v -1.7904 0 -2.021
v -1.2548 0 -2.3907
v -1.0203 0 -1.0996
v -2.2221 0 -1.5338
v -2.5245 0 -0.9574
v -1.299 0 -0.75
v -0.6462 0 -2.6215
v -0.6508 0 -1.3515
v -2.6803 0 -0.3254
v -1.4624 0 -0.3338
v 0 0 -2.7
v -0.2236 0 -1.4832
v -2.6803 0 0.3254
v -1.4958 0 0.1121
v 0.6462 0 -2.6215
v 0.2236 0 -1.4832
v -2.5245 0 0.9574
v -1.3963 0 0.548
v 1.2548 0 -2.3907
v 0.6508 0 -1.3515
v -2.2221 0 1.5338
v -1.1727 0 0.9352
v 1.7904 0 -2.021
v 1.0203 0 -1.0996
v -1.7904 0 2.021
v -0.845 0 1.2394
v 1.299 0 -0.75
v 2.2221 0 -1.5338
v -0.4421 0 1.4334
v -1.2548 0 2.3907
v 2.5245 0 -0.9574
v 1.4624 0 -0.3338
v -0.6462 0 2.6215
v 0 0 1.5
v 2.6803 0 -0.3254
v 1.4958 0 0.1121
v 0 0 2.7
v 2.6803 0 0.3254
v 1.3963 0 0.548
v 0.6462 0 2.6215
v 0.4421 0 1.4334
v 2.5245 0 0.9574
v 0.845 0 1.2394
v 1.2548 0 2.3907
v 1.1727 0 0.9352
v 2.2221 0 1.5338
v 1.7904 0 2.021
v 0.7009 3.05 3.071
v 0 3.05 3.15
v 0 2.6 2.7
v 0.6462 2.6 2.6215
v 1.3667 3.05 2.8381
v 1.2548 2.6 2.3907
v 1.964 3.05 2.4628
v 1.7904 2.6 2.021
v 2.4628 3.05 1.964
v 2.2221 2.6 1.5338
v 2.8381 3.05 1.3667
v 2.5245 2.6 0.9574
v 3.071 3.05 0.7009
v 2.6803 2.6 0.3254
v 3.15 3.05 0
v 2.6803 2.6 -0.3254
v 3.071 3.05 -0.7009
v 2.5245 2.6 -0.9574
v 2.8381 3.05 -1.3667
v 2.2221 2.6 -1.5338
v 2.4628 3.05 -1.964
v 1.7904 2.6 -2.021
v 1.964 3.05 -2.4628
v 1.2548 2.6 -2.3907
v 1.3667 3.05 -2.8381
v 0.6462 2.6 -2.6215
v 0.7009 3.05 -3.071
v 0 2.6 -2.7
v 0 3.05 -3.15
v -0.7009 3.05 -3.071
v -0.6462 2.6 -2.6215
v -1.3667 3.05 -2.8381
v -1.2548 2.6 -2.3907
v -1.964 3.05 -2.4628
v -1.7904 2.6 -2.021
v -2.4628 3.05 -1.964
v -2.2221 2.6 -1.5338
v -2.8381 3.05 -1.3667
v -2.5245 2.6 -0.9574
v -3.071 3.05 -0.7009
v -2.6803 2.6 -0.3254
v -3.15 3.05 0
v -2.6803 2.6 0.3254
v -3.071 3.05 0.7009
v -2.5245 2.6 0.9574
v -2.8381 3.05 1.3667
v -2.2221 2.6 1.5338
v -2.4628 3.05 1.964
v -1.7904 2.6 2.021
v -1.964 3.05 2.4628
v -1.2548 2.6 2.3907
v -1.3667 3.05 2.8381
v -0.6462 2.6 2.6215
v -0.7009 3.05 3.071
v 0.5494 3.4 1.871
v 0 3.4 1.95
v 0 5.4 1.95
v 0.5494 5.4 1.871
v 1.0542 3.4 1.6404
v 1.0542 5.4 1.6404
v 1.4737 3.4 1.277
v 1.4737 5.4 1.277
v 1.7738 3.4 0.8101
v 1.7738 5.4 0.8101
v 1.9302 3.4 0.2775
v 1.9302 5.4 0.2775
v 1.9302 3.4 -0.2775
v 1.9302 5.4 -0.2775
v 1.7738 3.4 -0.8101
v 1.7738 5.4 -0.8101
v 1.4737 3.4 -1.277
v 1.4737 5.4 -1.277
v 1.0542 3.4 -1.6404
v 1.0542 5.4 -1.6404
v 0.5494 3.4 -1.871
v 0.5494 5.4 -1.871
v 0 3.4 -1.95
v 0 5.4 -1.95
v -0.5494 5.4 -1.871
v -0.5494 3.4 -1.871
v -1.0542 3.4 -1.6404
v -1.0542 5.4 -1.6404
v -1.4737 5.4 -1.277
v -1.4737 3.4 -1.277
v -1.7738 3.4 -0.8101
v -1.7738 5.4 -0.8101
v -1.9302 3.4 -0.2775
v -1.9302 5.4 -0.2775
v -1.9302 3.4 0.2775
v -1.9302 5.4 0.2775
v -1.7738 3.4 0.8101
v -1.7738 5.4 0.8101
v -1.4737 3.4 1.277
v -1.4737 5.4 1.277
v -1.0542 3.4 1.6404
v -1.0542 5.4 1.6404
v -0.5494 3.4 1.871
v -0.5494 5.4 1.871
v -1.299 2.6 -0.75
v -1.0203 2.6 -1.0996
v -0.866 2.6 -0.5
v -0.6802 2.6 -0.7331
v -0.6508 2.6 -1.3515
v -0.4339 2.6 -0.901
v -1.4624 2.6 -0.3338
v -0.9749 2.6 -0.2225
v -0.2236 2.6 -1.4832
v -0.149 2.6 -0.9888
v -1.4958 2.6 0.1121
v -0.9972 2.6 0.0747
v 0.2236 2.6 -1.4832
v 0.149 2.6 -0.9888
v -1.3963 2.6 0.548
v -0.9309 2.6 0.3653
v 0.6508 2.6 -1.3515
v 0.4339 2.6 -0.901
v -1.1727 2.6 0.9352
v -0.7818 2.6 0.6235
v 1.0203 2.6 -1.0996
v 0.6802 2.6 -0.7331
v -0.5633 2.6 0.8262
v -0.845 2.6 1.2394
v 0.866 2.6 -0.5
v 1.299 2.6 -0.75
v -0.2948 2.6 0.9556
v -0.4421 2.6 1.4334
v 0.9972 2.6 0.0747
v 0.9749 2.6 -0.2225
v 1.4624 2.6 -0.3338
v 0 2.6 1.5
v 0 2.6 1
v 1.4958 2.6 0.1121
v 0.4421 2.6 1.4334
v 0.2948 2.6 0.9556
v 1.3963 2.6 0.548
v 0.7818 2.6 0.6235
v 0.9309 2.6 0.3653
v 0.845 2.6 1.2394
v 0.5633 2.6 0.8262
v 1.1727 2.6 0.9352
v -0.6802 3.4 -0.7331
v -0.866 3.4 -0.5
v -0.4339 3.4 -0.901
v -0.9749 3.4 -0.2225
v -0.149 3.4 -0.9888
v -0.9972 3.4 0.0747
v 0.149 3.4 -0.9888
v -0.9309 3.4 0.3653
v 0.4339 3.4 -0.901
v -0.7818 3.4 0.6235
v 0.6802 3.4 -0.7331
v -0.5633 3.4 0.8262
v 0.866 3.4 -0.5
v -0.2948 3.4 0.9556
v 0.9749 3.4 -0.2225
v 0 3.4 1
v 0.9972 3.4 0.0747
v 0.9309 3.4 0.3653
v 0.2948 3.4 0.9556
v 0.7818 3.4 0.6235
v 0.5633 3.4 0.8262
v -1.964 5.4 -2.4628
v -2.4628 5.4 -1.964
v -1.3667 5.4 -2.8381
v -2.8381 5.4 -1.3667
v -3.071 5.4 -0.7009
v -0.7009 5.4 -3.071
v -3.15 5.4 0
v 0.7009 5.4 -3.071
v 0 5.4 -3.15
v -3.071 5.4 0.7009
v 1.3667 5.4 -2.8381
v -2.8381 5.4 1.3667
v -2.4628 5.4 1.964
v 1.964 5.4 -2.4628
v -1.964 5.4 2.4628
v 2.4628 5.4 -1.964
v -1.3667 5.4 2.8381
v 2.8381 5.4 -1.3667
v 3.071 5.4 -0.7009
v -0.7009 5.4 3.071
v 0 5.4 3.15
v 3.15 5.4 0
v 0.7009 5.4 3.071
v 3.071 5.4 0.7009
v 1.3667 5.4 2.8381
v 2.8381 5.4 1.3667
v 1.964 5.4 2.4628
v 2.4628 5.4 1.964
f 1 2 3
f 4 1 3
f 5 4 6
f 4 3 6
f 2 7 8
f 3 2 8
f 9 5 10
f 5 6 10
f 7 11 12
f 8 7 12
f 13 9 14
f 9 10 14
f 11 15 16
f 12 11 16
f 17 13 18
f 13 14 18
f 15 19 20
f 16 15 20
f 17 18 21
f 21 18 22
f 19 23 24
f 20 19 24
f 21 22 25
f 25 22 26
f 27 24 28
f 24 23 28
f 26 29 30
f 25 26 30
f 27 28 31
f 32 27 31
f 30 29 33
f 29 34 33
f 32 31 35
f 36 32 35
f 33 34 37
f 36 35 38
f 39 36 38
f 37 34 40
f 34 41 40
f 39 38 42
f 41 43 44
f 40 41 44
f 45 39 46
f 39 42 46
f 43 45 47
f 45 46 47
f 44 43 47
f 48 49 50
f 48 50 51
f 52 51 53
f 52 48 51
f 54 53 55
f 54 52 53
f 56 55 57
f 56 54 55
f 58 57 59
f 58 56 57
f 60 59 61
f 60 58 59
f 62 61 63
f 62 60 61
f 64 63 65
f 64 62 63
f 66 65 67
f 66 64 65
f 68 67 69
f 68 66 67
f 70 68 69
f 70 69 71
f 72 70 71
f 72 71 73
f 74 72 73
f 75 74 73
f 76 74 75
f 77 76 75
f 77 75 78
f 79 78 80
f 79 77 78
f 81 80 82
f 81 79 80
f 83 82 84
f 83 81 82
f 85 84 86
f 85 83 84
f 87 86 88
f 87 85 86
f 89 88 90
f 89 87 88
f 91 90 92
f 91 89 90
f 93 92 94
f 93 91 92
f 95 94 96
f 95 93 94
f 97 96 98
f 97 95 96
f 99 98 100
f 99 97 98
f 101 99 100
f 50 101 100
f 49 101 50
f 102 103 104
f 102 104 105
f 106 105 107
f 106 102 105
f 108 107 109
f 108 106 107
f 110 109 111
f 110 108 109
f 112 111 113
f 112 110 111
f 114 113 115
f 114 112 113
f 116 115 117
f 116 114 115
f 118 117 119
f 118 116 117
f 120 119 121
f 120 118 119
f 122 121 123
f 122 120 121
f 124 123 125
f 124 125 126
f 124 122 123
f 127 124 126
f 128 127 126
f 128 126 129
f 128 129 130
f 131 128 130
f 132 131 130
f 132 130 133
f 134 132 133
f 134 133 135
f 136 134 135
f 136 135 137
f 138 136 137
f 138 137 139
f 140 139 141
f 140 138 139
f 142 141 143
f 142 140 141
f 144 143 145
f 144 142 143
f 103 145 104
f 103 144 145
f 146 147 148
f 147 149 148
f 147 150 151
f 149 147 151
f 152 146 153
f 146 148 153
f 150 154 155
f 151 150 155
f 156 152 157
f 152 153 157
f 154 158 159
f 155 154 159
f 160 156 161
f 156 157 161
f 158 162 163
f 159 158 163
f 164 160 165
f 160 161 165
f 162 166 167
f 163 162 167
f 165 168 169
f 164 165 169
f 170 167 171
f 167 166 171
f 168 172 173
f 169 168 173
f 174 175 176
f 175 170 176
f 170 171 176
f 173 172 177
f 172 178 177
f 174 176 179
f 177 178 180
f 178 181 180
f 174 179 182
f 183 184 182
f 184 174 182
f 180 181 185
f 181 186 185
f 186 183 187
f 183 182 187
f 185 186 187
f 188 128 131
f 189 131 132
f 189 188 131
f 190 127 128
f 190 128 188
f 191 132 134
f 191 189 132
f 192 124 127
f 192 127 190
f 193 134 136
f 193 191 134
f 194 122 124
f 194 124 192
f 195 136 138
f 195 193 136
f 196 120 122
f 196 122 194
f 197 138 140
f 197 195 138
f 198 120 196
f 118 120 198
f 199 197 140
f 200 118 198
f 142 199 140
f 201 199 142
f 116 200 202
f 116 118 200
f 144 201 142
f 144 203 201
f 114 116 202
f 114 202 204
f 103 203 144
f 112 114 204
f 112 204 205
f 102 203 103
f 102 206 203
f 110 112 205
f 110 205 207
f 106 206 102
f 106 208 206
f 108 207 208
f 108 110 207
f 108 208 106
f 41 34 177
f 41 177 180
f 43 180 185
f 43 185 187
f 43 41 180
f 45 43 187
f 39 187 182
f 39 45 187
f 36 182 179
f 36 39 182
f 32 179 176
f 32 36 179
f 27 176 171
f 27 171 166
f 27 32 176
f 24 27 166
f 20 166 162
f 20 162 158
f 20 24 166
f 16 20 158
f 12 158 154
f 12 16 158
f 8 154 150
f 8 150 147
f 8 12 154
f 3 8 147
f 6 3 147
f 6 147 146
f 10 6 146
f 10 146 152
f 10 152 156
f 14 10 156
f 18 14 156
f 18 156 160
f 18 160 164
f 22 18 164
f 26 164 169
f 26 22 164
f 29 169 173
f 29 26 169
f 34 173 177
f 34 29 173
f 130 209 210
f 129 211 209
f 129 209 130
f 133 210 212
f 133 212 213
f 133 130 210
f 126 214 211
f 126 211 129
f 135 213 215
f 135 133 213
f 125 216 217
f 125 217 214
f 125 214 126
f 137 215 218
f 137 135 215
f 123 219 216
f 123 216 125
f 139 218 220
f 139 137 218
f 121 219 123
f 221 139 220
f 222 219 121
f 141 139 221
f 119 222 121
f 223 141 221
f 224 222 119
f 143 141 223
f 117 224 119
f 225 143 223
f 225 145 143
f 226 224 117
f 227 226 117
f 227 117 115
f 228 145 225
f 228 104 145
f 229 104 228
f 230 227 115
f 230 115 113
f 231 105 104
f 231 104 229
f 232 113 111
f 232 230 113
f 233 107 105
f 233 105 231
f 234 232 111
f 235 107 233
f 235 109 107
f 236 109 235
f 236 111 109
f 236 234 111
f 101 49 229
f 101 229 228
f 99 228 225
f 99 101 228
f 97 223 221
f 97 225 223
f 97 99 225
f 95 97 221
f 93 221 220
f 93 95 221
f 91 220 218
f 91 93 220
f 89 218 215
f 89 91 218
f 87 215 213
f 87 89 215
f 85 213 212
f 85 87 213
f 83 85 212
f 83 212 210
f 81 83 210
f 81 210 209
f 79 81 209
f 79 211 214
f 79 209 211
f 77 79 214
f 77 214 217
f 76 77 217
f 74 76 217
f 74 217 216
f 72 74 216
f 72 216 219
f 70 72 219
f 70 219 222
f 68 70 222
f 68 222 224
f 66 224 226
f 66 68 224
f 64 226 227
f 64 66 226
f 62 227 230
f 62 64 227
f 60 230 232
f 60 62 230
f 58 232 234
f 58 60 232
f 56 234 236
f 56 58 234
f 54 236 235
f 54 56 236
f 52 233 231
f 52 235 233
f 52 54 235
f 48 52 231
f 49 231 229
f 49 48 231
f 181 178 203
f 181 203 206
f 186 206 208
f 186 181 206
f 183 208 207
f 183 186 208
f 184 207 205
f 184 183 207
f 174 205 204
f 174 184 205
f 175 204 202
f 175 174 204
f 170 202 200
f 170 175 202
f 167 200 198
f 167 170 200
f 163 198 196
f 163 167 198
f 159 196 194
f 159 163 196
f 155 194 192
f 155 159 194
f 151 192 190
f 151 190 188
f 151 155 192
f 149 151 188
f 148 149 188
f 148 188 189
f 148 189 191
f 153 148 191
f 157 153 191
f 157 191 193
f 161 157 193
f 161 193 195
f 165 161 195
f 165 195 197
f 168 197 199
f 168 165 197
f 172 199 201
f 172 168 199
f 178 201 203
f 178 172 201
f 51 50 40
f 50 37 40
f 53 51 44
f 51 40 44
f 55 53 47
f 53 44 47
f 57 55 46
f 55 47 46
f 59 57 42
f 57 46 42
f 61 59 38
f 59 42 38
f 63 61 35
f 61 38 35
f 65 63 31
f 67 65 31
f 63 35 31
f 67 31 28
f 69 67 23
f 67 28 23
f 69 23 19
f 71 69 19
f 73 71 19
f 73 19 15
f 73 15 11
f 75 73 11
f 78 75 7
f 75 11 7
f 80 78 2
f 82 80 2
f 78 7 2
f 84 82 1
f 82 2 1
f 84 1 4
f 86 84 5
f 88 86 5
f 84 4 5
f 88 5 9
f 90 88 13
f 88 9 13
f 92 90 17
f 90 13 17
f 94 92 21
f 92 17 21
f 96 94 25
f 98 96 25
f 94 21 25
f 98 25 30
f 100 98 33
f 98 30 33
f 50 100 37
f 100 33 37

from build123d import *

# Parameters (mm, degrees)
SKETCH_1_R      = 2.7
SKETCH_1_R_2    = 1.5
EXTRUDE_1_DEPTH = 2.6
SKETCH_2_R      = 2.7
SKETCH_2_R_2    = 1
EXTRUDE_2_DEPTH = 0.8
SKETCH_3_R      = 3.15
SKETCH_3_R_2    = 1.95
EXTRUDE_3_DEPTH = 2
CHAMFER_1_SIZE  = 0.8


with BuildPart() as part:
    # Эскиз1 → Бобышка-Вытянуть1 (new body)
    with BuildSketch(Plane(origin=(0, 0, 0), x_dir=(1, 0, 0), z_dir=(0, 1, 0))):
        with Locations(Location((0, 0, 0), (0, 0, 270))):
            Circle(SKETCH_1_R)
        with Locations(Location((0, 0, 0), (0, 0, 270))):
            Circle(SKETCH_1_R_2, mode=Mode.SUBTRACT)
    extrude(amount=EXTRUDE_1_DEPTH)

    # Эскиз2 → Бобышка-Вытянуть2 (add)
    with BuildSketch(Plane(origin=(0, 2.6, 0), x_dir=(1, 0, 0), z_dir=(0, 1, 0))):
        with Locations(Location((0, 0, 0), (0, 0, 270))):
            Circle(SKETCH_2_R)
        with Locations(Location((0, 0, 0), (0, 0, 270))):
            Circle(SKETCH_2_R_2, mode=Mode.SUBTRACT)
    extrude(amount=EXTRUDE_2_DEPTH)

    # Эскиз3 → Бобышка-Вытянуть3 (add)
    with BuildSketch(Plane(origin=(0, 3.4, 0), x_dir=(1, 0, 0), z_dir=(0, 1, 0))):
        with Locations(Location((0, 0, 0), (0, 0, 270))):
            Circle(SKETCH_3_R)
        with Locations(Location((0, 0, 0), (0, 0, 270))):
            Circle(SKETCH_3_R_2, mode=Mode.SUBTRACT)
    extrude(amount=EXTRUDE_3_DEPTH)

    # Фаска1
    # the kernel refuses this chamfer: 0.8 mm, written as the material it adds along each edge
    with BuildSketch(Plane(origin=(0, 3.4, 0), x_dir=(0, 0, 1), z_dir=(-1, 0, 0))) as chamfer_1_piece_1_section:
        Polygon((2.7, -CHAMFER_1_SIZE), (2.7 + CHAMFER_1_SIZE, 0), (2.7, 0), align=None)
    chamfer_1_piece_1 = revolve(axis=Axis((0, 3.4, 0), (0, 1, 0)), mode=Mode.PRIVATE)
    chamfer_1_piece_1 = chamfer_1_piece_1 & Plane(origin=(0, 2.825856837, 0), x_dir=(0, 0, 1), z_dir=(0, -1, 0)) * Cylinder(3.15, 14, mode=Mode.PRIVATE)
    add(chamfer_1_piece_1)


solid = part.part
